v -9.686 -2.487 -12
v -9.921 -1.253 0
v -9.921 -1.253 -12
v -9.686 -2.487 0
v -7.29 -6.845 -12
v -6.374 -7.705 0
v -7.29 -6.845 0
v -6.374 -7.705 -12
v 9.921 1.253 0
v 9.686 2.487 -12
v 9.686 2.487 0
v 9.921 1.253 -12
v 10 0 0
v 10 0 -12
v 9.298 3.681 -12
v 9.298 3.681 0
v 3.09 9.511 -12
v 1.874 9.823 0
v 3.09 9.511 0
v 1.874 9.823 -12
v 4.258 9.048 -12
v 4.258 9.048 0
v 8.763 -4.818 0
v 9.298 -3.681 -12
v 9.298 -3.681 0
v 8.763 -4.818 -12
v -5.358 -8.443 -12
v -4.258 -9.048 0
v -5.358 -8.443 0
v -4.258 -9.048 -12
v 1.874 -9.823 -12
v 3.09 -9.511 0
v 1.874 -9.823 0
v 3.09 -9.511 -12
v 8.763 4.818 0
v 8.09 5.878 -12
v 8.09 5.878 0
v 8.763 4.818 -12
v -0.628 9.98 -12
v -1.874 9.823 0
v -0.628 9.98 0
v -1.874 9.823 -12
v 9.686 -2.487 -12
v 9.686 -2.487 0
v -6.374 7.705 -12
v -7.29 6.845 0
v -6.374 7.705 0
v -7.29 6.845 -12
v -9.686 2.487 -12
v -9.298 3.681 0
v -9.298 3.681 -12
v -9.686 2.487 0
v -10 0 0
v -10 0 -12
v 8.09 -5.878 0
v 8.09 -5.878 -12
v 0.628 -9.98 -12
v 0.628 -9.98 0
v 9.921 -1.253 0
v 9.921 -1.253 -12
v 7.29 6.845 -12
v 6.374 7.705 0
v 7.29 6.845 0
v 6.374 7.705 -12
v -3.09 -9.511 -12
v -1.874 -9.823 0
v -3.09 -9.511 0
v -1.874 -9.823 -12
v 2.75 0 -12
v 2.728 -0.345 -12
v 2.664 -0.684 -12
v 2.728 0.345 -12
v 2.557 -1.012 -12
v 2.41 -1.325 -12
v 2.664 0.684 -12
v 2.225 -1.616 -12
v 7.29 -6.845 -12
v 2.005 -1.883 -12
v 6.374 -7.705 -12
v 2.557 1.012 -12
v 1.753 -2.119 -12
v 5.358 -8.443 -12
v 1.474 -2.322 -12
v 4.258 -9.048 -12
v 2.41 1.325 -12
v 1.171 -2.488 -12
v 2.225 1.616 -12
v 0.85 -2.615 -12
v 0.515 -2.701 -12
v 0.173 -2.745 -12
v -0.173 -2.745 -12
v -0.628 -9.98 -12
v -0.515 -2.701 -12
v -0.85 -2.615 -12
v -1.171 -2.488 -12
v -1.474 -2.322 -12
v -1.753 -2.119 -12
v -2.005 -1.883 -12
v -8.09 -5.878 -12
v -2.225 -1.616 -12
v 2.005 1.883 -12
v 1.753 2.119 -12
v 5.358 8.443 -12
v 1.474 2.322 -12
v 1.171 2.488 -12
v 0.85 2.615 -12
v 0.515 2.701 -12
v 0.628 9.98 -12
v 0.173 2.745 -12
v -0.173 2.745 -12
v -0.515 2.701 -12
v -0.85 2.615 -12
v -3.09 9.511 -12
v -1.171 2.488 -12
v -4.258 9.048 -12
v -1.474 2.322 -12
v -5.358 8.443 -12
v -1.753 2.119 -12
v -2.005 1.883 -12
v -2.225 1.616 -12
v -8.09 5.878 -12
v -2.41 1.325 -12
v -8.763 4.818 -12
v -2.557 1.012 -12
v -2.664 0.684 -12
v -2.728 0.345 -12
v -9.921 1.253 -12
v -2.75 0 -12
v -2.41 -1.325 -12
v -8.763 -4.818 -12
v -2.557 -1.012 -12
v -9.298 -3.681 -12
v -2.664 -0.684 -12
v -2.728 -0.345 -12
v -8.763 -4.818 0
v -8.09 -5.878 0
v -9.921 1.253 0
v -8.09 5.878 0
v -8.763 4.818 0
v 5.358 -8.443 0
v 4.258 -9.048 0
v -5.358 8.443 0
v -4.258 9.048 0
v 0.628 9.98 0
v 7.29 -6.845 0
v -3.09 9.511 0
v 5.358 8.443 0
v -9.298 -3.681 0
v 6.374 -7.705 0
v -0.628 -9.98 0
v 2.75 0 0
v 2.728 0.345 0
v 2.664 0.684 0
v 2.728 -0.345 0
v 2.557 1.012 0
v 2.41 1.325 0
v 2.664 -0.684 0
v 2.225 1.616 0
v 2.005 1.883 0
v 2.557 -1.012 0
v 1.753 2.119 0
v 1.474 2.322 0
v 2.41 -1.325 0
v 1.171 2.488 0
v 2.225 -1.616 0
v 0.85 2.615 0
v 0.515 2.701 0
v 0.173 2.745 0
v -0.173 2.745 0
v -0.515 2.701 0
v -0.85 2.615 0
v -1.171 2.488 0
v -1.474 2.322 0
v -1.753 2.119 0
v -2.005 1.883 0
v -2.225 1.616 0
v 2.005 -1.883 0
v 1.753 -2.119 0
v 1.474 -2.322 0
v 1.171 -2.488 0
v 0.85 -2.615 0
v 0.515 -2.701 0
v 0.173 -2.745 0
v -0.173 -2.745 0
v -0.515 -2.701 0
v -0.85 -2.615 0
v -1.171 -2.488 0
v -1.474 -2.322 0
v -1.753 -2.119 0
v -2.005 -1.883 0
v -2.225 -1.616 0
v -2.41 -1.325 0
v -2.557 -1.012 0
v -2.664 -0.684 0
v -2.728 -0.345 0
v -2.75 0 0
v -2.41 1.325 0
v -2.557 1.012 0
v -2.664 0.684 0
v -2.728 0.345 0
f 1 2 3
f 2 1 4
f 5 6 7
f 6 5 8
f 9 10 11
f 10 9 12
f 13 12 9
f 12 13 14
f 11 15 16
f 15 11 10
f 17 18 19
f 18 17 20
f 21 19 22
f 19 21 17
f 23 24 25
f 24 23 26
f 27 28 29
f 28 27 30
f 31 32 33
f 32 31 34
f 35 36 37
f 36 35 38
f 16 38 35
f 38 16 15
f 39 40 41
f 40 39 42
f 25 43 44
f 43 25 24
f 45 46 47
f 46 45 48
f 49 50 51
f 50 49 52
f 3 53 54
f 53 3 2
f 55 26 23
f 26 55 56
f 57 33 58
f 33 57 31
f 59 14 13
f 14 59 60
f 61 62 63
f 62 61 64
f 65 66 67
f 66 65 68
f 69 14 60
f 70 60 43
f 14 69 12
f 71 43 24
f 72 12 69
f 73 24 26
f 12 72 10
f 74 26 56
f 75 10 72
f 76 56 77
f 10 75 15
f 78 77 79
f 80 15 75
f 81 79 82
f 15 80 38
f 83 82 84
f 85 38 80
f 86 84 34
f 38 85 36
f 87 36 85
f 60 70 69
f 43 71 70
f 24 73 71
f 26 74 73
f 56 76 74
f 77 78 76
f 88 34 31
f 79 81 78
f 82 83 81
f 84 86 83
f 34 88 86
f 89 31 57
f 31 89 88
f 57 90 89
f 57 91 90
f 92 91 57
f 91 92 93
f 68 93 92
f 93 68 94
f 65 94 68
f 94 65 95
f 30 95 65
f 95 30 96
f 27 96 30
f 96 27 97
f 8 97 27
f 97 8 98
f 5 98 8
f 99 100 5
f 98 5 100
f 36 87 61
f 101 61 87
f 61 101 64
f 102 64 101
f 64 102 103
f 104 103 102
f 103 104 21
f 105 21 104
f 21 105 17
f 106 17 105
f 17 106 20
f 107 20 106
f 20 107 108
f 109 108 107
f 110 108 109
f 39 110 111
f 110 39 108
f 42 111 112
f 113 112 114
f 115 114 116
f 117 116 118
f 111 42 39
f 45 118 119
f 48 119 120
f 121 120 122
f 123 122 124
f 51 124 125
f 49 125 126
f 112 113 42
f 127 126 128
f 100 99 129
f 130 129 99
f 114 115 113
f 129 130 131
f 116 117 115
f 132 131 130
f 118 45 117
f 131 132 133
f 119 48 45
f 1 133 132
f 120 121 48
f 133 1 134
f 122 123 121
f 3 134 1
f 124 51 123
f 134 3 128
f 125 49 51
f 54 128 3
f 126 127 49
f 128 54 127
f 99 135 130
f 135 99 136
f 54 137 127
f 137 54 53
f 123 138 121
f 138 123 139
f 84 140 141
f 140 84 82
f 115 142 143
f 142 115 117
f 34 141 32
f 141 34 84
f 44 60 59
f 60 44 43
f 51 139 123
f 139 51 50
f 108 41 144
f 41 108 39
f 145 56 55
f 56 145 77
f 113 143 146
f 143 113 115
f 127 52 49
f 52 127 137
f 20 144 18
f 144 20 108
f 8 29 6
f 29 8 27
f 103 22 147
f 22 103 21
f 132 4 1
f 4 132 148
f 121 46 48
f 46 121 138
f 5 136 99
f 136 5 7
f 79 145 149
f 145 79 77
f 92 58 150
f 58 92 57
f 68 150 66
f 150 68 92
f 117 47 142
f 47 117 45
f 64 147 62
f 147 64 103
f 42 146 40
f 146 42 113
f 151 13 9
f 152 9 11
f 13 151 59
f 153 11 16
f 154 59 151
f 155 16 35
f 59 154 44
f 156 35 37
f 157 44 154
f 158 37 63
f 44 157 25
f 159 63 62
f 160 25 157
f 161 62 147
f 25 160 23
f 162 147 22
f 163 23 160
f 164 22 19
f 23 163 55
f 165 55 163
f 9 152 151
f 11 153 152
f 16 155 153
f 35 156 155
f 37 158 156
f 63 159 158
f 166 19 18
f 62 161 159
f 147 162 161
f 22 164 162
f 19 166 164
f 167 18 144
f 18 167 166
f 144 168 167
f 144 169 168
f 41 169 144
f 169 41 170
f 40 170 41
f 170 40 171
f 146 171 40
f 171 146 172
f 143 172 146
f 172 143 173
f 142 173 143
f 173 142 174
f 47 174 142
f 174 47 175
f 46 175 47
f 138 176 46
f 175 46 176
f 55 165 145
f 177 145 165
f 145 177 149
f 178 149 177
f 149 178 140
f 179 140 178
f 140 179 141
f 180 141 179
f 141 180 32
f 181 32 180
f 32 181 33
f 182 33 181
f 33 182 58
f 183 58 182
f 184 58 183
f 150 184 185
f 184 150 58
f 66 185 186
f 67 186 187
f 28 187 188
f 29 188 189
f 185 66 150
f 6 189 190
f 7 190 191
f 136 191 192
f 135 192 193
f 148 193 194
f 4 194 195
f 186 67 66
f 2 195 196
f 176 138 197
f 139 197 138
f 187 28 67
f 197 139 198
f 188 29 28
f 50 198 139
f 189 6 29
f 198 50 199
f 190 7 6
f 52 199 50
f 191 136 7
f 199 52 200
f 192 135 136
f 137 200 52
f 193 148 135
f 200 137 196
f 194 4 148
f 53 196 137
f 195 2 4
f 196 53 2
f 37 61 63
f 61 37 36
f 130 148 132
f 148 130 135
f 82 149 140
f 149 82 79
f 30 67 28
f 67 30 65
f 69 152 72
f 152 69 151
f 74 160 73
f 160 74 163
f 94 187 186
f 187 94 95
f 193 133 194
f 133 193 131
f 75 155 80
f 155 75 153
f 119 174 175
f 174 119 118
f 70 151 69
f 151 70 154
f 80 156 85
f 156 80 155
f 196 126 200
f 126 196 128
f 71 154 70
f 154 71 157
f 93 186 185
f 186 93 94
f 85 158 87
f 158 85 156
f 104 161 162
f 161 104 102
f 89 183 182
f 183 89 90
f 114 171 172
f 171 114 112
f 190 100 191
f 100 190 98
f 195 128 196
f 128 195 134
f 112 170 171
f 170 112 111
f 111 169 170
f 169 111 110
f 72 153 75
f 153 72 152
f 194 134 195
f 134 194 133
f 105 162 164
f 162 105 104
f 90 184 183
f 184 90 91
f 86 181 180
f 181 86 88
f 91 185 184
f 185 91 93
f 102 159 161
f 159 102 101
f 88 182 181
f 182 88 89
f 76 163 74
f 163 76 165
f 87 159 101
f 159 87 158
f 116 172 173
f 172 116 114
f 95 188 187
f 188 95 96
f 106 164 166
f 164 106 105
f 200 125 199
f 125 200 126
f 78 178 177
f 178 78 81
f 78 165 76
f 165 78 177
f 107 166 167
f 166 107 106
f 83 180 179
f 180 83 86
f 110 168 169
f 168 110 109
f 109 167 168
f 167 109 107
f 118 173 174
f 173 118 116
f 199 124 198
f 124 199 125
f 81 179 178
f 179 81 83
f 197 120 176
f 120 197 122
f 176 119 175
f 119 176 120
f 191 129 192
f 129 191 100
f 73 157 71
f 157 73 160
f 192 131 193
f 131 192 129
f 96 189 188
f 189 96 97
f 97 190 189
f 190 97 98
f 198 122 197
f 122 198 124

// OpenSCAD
$fn = 50;


difference() {
	union() {
		translate(v = [0, 0, -12.0000000000]) {
			cylinder(h = 12, r = 10.0000000000);
		}
		cylinder(h = 0, r = 16.0000000000);
	}
	union() {
		#translate(v = [0, 0, -12]) {
			cylinder(h = 12, r = 2.7500000000);
		}
	}
}
